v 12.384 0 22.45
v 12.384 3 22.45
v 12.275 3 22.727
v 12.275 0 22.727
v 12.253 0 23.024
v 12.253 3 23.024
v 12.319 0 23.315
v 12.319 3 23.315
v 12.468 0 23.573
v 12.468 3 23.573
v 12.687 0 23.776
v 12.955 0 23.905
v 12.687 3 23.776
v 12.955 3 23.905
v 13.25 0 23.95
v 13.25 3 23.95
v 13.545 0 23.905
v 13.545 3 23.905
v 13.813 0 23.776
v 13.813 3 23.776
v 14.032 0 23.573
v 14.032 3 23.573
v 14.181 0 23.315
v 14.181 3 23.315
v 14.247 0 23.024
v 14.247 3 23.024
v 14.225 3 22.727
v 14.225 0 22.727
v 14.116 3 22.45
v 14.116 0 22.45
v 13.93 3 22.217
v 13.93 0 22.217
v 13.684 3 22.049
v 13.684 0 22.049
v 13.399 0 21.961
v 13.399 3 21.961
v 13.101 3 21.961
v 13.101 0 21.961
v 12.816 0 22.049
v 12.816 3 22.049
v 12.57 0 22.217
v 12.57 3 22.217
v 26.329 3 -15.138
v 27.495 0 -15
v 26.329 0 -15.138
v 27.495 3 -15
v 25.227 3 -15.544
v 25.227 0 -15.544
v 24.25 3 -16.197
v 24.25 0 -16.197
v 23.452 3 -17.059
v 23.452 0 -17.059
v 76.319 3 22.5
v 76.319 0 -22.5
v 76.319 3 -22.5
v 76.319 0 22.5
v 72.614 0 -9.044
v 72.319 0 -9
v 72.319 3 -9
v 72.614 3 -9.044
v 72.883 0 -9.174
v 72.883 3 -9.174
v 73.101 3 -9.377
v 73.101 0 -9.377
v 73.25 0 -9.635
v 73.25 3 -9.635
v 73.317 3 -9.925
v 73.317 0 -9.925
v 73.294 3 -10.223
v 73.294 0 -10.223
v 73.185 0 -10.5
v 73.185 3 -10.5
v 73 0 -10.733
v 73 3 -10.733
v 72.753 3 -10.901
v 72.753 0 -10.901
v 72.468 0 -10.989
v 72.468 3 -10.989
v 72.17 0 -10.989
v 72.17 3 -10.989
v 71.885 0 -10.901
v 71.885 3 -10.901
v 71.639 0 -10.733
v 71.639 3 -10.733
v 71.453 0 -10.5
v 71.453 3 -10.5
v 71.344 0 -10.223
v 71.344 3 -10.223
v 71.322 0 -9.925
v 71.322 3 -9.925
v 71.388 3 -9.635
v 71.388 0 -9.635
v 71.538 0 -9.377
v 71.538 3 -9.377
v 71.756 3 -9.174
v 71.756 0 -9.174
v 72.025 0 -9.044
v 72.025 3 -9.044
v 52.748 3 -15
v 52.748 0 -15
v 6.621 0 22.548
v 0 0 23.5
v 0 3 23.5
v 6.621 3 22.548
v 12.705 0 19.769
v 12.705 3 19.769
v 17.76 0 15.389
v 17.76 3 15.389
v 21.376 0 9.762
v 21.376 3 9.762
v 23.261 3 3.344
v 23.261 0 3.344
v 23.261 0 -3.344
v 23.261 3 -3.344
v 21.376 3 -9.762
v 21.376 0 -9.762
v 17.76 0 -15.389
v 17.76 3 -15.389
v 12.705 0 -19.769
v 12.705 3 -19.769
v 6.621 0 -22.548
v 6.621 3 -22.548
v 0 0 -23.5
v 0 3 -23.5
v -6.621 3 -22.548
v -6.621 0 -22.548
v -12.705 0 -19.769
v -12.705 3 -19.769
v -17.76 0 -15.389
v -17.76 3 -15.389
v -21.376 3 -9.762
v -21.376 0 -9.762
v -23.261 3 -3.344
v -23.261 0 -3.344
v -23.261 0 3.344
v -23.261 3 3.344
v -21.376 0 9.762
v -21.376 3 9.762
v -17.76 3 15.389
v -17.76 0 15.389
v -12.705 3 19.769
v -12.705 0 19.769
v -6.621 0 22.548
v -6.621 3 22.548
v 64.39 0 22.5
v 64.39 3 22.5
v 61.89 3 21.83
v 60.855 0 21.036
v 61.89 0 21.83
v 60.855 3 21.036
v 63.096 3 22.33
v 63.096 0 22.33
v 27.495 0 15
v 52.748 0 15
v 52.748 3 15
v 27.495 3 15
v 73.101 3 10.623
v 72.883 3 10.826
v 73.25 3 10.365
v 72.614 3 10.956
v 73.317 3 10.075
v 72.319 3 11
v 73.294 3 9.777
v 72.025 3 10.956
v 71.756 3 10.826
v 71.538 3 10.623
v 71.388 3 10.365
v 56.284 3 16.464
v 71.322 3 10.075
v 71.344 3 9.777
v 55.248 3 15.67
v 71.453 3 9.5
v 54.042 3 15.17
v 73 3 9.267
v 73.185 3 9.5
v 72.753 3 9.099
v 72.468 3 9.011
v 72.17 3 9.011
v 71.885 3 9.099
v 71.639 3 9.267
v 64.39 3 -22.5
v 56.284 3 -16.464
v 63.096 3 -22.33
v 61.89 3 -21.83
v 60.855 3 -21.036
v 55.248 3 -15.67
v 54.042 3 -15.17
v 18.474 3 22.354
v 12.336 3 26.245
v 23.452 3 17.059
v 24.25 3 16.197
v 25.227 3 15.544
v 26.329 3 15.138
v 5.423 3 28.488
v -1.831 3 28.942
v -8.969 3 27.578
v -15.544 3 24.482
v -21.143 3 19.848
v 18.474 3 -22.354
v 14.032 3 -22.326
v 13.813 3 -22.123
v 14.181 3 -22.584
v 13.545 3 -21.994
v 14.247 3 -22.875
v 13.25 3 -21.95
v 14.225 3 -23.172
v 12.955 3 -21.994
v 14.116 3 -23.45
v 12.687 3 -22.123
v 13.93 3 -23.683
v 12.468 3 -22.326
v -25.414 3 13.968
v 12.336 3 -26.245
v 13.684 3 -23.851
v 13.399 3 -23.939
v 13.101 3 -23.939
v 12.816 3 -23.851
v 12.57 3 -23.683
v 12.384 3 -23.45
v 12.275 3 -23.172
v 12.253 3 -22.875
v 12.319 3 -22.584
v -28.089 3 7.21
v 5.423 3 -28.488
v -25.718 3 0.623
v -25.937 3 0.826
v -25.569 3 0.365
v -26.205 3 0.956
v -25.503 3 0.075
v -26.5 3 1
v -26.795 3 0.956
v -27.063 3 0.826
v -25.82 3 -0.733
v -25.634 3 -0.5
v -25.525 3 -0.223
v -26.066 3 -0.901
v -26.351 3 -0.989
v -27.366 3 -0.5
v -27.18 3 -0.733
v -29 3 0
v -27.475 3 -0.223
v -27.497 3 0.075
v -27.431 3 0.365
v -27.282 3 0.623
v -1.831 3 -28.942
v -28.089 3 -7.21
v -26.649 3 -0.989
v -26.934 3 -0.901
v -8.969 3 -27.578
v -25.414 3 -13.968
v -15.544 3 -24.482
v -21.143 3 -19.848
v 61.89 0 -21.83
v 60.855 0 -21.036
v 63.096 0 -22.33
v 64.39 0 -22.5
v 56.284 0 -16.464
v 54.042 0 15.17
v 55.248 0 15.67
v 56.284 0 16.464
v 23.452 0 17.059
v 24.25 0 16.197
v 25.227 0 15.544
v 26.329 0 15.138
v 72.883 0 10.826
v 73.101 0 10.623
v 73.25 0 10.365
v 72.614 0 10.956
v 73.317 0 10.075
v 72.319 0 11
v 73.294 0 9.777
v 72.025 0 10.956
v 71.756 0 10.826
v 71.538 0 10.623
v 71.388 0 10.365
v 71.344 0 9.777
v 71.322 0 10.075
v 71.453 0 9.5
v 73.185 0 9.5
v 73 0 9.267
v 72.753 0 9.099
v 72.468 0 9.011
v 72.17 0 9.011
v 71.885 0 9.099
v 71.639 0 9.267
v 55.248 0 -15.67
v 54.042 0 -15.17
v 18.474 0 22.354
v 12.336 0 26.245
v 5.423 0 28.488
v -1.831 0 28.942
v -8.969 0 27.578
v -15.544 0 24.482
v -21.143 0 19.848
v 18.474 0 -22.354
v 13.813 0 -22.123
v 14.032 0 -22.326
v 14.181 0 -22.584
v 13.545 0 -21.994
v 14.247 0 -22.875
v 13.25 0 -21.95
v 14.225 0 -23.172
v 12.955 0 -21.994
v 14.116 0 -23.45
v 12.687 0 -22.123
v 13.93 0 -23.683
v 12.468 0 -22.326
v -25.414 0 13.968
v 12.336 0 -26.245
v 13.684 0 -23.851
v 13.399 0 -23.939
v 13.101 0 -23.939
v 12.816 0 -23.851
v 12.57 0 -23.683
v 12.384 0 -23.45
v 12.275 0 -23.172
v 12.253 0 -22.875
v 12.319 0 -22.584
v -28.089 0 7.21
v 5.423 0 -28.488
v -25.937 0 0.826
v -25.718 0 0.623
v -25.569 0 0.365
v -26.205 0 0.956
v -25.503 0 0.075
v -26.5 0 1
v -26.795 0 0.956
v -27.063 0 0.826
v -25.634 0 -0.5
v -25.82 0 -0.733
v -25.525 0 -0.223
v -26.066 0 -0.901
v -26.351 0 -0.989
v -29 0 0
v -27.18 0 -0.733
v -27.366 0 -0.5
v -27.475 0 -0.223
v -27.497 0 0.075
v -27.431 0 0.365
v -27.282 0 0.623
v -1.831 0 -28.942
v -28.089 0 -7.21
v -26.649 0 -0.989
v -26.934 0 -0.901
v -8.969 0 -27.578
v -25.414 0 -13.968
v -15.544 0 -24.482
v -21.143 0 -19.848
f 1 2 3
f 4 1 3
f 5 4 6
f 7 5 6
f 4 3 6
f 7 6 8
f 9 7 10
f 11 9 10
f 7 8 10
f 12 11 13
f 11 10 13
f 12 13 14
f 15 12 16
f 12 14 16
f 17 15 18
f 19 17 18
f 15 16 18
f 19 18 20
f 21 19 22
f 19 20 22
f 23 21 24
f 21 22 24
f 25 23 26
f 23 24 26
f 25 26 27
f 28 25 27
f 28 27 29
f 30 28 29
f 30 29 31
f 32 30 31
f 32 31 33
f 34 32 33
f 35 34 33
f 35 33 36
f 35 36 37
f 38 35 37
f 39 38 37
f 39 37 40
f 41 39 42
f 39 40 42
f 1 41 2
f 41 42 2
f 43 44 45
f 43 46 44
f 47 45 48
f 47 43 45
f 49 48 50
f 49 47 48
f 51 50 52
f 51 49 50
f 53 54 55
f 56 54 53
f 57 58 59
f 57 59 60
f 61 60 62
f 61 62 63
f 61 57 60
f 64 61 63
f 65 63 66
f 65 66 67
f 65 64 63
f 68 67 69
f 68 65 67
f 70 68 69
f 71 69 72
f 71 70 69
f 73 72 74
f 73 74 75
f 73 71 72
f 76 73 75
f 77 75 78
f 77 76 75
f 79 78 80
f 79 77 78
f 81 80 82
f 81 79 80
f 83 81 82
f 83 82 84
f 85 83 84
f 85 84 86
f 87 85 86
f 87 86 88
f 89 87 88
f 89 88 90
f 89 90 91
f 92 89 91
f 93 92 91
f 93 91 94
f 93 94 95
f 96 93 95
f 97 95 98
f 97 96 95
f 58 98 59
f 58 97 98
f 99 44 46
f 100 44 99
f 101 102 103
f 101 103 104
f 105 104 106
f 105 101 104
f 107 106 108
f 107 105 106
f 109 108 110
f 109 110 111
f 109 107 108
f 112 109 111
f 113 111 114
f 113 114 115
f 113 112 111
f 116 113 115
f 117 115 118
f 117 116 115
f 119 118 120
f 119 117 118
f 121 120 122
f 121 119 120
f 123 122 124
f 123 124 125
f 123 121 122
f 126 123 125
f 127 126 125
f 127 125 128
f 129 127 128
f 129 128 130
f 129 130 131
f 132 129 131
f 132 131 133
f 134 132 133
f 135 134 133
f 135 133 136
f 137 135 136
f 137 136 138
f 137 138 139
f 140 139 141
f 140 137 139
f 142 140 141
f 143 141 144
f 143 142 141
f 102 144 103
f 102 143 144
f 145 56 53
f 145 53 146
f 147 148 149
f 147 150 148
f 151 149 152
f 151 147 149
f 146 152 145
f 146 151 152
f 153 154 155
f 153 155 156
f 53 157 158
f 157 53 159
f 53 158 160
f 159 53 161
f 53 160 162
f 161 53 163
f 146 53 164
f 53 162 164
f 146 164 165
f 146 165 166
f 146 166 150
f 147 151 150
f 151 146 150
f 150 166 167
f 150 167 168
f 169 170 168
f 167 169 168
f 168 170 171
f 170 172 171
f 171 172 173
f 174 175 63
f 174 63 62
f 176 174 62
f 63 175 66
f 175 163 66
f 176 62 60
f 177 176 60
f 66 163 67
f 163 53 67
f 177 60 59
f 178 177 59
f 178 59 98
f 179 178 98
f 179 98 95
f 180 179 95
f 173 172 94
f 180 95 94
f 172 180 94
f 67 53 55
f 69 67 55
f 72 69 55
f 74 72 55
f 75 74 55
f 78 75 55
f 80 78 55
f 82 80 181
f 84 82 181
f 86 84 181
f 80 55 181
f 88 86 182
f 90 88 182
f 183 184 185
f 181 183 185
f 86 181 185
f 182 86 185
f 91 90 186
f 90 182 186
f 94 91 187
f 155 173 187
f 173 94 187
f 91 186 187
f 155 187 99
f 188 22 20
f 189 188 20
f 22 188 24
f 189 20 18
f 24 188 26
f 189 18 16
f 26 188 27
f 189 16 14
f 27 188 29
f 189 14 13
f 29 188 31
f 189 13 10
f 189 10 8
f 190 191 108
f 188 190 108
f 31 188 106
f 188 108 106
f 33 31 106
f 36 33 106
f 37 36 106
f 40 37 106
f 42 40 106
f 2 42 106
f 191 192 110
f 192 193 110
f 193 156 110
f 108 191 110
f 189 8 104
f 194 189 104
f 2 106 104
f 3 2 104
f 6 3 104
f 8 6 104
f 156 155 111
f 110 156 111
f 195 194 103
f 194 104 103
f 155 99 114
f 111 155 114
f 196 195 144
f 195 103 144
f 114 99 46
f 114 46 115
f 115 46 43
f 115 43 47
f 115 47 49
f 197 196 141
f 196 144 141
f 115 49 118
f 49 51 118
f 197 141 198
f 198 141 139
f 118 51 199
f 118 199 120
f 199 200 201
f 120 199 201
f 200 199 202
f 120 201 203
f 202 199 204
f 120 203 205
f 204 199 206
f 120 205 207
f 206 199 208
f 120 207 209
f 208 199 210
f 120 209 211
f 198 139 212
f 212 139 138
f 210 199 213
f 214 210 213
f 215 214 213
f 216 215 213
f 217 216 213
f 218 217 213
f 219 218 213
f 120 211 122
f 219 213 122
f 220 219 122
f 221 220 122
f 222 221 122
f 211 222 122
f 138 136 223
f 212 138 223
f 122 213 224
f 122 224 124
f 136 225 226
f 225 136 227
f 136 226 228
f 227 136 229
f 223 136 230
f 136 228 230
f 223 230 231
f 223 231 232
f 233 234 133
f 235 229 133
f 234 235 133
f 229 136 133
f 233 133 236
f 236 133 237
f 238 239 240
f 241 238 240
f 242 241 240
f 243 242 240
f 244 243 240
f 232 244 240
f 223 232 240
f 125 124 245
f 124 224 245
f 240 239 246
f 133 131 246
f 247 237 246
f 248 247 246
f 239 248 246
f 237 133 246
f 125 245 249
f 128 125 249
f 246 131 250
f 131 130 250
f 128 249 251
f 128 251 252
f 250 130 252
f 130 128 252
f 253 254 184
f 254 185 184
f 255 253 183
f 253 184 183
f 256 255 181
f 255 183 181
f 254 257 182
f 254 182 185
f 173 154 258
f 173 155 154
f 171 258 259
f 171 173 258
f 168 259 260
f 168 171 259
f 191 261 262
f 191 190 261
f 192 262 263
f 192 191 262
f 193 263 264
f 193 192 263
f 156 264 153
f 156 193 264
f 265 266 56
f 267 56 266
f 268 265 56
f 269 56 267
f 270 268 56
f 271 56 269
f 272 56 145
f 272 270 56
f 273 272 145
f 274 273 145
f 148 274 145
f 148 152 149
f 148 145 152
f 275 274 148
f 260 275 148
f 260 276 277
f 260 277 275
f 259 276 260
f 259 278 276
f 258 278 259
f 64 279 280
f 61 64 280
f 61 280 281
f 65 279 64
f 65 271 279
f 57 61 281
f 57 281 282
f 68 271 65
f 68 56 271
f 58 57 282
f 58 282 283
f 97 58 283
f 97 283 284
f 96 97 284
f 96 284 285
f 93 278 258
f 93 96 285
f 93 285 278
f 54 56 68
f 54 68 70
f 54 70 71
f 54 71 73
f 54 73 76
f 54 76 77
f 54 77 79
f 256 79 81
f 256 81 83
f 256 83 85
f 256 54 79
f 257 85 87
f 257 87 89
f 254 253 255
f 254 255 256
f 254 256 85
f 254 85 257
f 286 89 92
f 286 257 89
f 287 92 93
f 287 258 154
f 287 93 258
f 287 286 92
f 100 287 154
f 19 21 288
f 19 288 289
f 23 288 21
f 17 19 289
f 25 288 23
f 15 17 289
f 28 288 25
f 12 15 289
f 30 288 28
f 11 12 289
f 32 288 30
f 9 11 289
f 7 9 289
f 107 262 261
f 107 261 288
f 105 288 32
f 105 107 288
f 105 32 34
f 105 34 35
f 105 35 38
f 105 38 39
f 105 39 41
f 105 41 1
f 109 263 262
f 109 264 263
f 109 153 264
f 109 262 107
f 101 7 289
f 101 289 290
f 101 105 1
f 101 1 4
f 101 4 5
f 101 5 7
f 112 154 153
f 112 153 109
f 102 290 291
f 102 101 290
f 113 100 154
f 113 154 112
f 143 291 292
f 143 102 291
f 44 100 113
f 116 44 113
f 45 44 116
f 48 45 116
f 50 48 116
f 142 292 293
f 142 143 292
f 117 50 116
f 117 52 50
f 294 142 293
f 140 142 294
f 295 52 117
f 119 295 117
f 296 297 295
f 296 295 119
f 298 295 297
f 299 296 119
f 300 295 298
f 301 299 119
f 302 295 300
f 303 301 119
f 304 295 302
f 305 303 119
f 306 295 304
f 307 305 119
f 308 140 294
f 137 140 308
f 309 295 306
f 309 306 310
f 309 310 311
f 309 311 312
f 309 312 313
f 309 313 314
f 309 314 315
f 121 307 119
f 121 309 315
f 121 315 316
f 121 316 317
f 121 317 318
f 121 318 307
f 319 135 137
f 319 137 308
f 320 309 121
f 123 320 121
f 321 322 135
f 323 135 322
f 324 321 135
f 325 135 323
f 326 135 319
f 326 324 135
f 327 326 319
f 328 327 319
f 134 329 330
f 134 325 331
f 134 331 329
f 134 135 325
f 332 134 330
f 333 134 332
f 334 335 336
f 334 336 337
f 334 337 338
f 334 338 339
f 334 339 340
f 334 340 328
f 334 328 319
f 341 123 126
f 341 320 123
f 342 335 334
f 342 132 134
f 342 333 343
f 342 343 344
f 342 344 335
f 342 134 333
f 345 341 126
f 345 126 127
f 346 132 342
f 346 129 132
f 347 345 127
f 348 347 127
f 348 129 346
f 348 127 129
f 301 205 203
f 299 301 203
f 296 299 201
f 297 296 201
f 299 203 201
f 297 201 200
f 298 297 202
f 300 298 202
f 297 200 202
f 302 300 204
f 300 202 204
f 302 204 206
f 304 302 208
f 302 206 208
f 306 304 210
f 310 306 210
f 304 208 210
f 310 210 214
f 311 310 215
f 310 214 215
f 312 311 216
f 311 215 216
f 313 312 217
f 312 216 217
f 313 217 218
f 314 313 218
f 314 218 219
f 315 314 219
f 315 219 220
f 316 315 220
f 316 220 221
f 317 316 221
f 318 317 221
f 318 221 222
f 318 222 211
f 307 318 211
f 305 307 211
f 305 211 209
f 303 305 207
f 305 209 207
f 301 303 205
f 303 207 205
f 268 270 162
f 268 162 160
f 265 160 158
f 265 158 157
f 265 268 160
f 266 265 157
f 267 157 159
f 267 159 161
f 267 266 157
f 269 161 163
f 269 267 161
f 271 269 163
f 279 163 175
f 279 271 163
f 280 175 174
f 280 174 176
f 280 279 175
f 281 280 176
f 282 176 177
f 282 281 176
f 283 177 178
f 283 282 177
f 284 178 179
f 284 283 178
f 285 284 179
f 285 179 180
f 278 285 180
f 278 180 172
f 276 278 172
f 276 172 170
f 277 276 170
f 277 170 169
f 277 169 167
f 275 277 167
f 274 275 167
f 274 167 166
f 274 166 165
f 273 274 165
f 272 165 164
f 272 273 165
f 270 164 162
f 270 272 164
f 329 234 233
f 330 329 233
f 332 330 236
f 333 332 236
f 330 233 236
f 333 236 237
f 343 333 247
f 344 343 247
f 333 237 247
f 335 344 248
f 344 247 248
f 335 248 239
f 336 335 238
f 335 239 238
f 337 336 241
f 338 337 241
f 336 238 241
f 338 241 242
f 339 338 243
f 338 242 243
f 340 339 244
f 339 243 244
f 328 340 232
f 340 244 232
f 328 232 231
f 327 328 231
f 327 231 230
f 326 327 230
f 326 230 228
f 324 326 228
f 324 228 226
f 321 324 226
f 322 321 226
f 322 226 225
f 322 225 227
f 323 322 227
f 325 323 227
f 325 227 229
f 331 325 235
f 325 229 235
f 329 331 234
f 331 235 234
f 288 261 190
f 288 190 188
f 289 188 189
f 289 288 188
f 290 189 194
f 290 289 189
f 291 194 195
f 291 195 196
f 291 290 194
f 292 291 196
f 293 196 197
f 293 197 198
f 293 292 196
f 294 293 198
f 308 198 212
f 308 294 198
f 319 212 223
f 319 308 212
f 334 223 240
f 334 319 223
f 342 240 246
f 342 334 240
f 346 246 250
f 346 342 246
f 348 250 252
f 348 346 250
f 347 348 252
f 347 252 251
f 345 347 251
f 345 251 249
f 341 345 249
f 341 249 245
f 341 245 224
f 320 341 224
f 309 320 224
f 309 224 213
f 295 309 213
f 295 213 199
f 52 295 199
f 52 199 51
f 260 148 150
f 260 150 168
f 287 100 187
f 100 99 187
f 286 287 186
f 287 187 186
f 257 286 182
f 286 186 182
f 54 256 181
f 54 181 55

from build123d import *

# Parameters (mm, degrees)
SKETCH2_R           = 23.5
SKETCH2_R_2         = 1
BOSS_EXTRUDE1_DEPTH = 3
FILLET1_R           = 5
SKETCH3_R           = 1
CUT_EXTRUDE1_DEPTH  = 3
CIRPATTERN1_COUNT   = 3


with BuildPart() as part:
    # Sketch2 → Boss-Extrude1 (new body)
    with BuildSketch(Plane(origin=(0, 0, 0), x_dir=(1, 0, 0), z_dir=(0, 1, 0))):
        with BuildLine():
            Line((24.819347292, 15), (54.819347292, 15))
            Line((54.819347292, 15), (62.319347292, 22.5))
            Line((62.319347292, 22.5), (76.319347292, 22.5))
            Line((76.319347292, 22.5), (76.319347292, -22.5))
            Line((76.319347292, -22.5), (62.319347292, -22.5))
            Line((62.319347292, -22.5), (54.819347292, -15))
            Line((54.819347292, -15), (24.819347292, -15))
            ThreePointArc((24.819347292, -15), (-29, 0), (24.819347292, 15))
        make_face()
        with Locations(Location((0, 0, 0), (0, 0, 270))):
            Circle(SKETCH2_R, mode=Mode.SUBTRACT)
        with Locations(Location((72.319347292, 10, 0), (0, 0, 270))):
            Circle(SKETCH2_R_2, mode=Mode.SUBTRACT)
        with Locations(Location((72.319347292, -10, 0), (0, 0, 270))):
            Circle(SKETCH2_R_2, mode=Mode.SUBTRACT)
    extrude(amount=BOSS_EXTRUDE1_DEPTH)

    # Fillet1
    fillet1_edges = [part.edges().sort_by_distance(p)[0] for p in [
        (54.819347292, 1.5, -15),
        (62.319347292, 1.5, -22.5),
        (62.319347292, 1.5, 22.5),
        (54.819347292, 1.5, 15),
        (24.819347292, 1.5, 15),
        (24.819347292, 1.5, -15),
    ]]
    fillet(fillet1_edges, radius=FILLET1_R)

    # Sketch3 → Cut-Extrude1 (cut)
    with BuildSketch(Plane(origin=(0, 3, 0), x_dir=(1, 0, 0), z_dir=(0, 1, 0))):
        with Locations(Location((13.25, 22.9496732, 0), (0, 0, 270))):
            Circle(SKETCH3_R)
    cut_extrude1 = extrude(amount=-CUT_EXTRUDE1_DEPTH, mode=Mode.SUBTRACT)

    # CirPattern1: Cut-Extrude1 ×3 about axis
    cirpattern1_axis = Axis((0, 0, 0), (0, 1, 0))
    for i in range(1, CIRPATTERN1_COUNT):
        add(cut_extrude1.rotate(cirpattern1_axis, i * 360 / CIRPATTERN1_COUNT), mode=Mode.SUBTRACT)


solid = part.part
